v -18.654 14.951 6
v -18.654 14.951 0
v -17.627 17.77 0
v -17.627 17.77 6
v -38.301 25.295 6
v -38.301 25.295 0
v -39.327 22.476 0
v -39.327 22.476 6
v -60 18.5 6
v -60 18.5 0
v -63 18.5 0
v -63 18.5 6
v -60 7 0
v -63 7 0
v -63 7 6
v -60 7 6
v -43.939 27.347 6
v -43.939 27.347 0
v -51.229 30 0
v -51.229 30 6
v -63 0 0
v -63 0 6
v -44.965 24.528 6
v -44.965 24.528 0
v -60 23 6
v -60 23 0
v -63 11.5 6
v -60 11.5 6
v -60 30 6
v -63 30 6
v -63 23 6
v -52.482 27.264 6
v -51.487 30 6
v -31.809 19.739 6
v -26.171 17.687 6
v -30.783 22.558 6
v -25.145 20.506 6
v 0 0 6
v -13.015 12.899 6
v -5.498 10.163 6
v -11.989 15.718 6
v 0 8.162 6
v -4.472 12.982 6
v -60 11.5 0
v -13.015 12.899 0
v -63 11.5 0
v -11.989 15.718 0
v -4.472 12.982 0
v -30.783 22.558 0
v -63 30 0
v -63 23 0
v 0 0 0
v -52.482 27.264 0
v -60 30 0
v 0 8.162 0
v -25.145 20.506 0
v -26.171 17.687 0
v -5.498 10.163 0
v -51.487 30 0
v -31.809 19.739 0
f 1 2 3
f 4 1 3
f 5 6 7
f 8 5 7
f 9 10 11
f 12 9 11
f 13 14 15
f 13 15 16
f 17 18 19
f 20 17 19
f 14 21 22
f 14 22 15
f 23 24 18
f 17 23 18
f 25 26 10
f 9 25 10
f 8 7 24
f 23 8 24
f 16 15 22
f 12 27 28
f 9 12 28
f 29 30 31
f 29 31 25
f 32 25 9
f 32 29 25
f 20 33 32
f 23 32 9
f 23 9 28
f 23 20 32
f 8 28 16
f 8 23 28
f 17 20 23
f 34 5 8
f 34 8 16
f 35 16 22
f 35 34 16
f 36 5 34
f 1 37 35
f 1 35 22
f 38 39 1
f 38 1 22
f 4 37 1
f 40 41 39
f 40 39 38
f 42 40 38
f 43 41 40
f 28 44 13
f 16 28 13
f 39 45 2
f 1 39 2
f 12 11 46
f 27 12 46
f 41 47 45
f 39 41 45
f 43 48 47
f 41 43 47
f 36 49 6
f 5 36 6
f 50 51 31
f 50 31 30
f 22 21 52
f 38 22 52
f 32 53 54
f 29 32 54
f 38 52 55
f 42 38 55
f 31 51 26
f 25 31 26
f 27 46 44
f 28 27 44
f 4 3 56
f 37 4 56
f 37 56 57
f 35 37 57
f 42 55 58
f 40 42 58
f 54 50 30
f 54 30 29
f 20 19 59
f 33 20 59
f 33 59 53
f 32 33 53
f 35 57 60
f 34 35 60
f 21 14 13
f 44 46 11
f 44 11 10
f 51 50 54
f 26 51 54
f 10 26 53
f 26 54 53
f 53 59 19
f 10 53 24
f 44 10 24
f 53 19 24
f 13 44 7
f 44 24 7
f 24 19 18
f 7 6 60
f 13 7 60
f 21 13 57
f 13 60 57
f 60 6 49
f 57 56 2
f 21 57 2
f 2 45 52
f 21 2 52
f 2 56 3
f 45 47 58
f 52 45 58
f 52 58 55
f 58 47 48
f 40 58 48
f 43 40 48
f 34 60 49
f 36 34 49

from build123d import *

# Parameters (mm, degrees)
BOSS_EXTRU_1_DEPTH = 6


with BuildPart() as part:
    # Esquisse1 → Boss.-Extru.1 (new body)
    with BuildSketch(Plane.XY):
        Polygon((-52.482459034, 27.263838853), (-60, 30), (-63, 30), (-63, 23), (-60, 23), (-60, 18.5), (-63, 18.5), (-63, 11.5), (-60, 11.5), (-60, 7), (-63, 7), (-63, 0), (0, 0), (0, 8.161785944), (-5.497827994, 10.162831687), (-4.471767564, 12.981909549), (-11.989308531, 15.718070696), (-13.015368961, 12.898992834), (-18.653524685, 14.951113694), (-17.627464255, 17.770191556), (-25.145005222, 20.506352703), (-26.171065652, 17.68727484), (-31.809221376, 19.7393957), (-30.783160946, 22.558473563), (-38.300701913, 25.294634709), (-39.326762343, 22.475556847), (-44.964918067, 24.527677707), (-43.938857637, 27.346755569), (-51.2285868, 30), (-51.48657782, 30), align=None)
    extrude(amount=BOSS_EXTRU_1_DEPTH)


solid = part.part
